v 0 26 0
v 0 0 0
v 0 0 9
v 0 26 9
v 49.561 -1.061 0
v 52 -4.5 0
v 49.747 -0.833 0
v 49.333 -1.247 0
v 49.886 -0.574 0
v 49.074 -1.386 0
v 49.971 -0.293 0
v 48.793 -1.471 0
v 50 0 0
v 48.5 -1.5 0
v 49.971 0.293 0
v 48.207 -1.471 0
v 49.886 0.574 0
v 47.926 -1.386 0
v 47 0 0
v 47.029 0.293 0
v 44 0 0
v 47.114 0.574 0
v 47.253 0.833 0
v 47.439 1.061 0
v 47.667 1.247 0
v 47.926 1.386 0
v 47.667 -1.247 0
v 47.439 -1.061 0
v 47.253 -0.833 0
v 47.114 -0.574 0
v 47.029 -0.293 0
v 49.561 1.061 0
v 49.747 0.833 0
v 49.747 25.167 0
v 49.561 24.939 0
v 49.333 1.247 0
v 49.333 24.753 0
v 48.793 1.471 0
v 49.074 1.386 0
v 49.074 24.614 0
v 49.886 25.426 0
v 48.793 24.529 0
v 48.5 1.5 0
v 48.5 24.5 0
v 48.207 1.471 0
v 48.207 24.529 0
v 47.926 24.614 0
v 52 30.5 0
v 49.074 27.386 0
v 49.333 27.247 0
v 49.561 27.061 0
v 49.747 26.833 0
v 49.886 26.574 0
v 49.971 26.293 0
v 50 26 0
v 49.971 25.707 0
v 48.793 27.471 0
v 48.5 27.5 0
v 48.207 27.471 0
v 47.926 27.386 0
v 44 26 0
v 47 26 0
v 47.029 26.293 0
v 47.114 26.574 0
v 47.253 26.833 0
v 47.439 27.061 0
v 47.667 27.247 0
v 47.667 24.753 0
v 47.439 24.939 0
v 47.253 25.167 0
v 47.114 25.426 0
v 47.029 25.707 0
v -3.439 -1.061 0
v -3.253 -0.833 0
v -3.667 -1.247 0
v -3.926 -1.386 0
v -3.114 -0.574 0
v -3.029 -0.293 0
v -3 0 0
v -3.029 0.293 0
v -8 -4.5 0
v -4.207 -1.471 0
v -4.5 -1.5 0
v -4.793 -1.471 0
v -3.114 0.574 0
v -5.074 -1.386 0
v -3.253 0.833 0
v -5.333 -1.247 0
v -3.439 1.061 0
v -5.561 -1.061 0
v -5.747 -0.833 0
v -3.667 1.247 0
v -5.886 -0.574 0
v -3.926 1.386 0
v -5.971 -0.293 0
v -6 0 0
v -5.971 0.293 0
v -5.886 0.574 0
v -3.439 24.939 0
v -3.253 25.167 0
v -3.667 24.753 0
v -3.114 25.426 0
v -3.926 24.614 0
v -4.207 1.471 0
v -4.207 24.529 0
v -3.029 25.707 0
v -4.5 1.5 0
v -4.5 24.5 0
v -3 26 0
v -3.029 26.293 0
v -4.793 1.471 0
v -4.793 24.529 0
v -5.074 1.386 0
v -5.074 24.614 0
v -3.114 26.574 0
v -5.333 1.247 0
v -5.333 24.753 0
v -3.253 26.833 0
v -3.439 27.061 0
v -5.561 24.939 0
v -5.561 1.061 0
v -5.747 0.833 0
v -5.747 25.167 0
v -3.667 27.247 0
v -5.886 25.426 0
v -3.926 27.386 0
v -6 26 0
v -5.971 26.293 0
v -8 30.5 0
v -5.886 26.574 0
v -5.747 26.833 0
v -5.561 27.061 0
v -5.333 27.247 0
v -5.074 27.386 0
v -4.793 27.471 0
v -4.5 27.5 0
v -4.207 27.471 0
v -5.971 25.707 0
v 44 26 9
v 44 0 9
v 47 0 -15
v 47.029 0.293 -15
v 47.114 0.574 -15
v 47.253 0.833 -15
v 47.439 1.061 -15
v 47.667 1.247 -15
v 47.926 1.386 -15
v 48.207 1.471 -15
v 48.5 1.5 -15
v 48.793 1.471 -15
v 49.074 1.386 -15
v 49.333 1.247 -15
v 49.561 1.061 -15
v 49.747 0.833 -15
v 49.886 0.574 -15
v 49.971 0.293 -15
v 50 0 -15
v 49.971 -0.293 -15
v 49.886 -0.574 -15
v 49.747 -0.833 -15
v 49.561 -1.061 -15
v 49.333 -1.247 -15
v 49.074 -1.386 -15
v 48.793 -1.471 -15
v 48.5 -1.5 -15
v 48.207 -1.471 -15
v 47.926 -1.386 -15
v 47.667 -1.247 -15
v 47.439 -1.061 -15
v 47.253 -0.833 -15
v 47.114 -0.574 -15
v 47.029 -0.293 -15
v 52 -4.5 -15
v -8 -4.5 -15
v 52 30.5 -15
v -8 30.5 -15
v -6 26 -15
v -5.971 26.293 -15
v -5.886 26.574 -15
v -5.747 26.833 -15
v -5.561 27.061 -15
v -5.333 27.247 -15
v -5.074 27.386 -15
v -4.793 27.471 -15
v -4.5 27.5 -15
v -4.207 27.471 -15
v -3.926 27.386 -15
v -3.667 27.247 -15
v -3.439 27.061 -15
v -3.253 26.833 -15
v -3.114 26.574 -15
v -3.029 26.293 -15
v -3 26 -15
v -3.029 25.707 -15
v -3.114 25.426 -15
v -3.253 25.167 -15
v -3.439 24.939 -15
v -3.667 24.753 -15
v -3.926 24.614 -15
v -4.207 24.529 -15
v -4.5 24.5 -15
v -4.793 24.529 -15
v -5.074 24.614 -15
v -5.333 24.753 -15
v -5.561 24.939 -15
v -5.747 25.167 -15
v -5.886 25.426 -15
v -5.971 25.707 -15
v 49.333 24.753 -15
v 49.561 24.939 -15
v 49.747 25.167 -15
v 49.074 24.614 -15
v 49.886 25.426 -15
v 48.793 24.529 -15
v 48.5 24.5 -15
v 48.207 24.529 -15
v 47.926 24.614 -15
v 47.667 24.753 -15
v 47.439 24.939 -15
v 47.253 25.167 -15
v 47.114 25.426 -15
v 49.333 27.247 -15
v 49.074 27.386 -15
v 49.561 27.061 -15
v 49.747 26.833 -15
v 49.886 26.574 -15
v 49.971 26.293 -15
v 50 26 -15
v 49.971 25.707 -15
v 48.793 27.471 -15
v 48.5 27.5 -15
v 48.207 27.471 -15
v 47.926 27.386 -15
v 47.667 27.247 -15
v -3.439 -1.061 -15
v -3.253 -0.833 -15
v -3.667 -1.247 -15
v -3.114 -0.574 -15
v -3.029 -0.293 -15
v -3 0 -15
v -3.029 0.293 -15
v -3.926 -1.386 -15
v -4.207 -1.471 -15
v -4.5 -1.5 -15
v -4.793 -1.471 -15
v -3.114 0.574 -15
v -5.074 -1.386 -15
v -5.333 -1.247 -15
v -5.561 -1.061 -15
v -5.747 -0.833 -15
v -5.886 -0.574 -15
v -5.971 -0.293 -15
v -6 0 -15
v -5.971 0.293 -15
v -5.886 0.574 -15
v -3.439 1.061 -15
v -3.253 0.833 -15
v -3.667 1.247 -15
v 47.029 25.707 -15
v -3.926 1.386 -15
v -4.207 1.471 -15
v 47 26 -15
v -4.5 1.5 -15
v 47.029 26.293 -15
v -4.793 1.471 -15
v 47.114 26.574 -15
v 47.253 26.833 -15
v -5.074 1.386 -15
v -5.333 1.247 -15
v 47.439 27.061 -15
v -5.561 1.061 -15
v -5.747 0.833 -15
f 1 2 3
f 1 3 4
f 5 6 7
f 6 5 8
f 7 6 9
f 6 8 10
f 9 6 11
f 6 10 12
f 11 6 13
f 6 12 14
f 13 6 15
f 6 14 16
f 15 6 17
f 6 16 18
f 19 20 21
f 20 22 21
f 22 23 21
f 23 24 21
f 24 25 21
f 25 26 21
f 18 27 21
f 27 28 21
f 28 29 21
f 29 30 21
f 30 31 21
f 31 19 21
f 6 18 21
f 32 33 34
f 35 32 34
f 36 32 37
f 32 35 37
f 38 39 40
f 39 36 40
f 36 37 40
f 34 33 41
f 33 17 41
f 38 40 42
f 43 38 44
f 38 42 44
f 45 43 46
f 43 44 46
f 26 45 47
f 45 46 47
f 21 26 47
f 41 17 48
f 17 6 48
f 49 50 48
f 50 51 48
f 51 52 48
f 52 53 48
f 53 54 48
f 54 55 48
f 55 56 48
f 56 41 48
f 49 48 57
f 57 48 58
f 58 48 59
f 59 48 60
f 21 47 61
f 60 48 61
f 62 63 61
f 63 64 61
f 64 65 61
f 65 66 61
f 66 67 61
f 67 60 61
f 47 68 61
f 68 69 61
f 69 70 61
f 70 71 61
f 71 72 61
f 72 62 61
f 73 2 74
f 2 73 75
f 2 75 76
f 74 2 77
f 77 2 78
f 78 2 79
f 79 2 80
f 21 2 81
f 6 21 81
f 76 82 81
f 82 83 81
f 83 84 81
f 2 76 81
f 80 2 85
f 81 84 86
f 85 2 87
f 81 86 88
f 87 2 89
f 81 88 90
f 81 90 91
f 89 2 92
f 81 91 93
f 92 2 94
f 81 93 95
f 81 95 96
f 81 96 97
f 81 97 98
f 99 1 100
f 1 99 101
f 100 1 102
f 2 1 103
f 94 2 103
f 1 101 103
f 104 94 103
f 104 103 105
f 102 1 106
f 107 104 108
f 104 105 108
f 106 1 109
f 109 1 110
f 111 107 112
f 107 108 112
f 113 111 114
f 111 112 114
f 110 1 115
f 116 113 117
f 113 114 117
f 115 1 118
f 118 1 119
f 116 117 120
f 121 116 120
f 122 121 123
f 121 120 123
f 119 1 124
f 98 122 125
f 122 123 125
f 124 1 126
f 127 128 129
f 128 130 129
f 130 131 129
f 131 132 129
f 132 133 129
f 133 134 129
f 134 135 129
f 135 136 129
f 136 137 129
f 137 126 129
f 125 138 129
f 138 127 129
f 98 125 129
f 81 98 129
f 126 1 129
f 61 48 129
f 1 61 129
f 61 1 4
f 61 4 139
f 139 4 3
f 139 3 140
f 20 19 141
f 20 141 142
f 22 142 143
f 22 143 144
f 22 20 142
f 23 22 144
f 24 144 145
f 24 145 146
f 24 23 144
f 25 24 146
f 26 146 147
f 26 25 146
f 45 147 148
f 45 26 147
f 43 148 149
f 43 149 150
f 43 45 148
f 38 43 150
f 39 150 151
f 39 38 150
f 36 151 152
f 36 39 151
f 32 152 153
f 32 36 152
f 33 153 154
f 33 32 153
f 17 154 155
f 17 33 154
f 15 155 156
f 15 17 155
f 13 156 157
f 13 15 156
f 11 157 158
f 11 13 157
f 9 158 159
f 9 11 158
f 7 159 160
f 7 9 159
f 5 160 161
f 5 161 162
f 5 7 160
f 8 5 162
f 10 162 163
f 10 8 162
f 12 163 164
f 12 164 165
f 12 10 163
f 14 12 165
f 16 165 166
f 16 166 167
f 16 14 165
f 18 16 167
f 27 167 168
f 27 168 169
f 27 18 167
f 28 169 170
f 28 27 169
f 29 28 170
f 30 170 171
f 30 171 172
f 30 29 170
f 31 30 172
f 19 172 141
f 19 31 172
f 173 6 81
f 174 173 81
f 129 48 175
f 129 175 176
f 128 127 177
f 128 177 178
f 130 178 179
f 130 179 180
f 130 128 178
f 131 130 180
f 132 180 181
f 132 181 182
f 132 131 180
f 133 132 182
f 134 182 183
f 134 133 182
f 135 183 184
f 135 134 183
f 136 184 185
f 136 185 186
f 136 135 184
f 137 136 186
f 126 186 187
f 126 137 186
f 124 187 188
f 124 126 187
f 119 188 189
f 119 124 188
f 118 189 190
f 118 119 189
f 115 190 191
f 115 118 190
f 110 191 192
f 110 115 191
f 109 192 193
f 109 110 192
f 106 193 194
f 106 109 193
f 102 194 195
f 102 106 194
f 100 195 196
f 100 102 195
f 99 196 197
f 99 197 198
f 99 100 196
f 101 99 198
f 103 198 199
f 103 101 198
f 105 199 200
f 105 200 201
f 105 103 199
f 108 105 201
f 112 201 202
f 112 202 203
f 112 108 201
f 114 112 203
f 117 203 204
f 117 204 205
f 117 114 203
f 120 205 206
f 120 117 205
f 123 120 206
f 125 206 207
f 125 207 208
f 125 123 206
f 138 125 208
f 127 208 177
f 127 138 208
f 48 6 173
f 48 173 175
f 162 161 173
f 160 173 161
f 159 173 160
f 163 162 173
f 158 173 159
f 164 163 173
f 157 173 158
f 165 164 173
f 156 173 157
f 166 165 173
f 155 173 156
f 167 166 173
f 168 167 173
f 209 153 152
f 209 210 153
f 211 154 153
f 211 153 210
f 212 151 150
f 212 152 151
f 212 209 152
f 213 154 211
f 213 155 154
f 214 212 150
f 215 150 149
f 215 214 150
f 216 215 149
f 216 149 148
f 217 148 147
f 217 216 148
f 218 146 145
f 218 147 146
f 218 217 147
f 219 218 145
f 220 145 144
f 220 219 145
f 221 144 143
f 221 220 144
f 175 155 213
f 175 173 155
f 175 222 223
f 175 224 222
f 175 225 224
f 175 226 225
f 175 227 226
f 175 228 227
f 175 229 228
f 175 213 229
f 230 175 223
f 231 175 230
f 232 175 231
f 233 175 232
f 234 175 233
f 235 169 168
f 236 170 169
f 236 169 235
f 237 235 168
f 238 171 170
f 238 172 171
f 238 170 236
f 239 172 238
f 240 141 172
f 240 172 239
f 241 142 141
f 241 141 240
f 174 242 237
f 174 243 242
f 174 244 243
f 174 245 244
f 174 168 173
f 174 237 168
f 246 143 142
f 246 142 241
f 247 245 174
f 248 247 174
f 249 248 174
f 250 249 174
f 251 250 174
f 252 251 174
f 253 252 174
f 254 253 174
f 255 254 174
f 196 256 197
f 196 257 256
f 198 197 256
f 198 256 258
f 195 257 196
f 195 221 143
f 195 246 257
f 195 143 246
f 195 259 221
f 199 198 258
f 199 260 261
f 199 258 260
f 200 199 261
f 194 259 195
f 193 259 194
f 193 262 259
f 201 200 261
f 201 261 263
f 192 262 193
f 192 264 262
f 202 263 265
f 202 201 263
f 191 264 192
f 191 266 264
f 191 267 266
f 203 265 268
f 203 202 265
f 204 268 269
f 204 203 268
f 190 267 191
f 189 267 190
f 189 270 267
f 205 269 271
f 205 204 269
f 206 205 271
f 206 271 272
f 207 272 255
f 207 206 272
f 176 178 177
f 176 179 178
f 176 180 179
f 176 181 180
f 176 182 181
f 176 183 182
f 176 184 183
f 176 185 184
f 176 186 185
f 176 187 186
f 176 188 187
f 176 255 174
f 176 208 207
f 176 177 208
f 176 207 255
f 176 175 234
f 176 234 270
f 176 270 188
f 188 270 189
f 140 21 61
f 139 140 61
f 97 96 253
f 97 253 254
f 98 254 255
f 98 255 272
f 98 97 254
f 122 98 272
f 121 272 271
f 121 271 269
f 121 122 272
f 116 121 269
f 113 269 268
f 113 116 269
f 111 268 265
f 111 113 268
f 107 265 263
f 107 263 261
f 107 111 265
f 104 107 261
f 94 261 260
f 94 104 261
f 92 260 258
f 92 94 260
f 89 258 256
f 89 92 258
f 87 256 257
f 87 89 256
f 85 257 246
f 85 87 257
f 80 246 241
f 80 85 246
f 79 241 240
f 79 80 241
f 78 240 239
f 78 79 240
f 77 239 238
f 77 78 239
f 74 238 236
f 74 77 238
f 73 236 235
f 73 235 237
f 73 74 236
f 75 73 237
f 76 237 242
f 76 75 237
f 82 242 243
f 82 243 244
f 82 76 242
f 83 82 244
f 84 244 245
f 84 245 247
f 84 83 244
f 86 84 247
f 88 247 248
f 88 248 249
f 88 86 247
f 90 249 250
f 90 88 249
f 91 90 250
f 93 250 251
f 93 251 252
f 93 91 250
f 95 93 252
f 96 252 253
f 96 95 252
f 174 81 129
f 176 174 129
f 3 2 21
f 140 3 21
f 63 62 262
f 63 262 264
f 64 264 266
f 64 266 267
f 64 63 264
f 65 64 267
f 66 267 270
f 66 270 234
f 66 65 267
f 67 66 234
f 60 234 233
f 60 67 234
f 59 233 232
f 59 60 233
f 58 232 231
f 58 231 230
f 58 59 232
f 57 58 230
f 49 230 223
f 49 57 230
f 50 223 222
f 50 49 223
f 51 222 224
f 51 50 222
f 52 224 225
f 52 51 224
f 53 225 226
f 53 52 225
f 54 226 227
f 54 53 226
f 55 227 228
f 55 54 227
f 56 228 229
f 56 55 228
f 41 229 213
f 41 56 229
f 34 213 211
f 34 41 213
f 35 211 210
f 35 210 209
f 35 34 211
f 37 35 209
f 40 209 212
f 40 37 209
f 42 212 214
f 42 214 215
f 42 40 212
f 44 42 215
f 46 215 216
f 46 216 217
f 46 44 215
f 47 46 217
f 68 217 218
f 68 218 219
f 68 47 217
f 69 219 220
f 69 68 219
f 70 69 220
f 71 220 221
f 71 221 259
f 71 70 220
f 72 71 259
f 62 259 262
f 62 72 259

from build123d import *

# Parameters (mm, degrees)
CROQUIS1_W              = 44
CROQUIS1_H              = 26
SALIENTE_EXTRUIR1_DEPTH = 9
CROQUIS2_W              = 60
CROQUIS2_H              = 35
CROQUIS2_R              = 1.5
SALIENTE_EXTRUIR2_DEPTH = 15


with BuildPart() as part:
    # Croquis1 → Saliente-Extruir1 (new body)
    with BuildSketch(Plane.XY):
        with Locations((22, 13)):
            Rectangle(CROQUIS1_W, CROQUIS1_H)
    extrude(amount=SALIENTE_EXTRUIR1_DEPTH)

    # Croquis2 → Saliente-Extruir2 (add)
    with BuildSketch(Plane(origin=(0, 0, 0), x_dir=(-1, 0, 0), z_dir=(0, 0, -1))):
        with Locations((-22, 13)):
            Rectangle(CROQUIS2_W, CROQUIS2_H)
        with Locations((-48.5, 26)):
            Circle(CROQUIS2_R, mode=Mode.SUBTRACT)
        with Locations((4.5, 26)):
            Circle(CROQUIS2_R, mode=Mode.SUBTRACT)
        with Locations((-48.5, 0)):
            Circle(CROQUIS2_R, mode=Mode.SUBTRACT)
        with Locations((4.5, 0)):
            Circle(CROQUIS2_R, mode=Mode.SUBTRACT)
    extrude(amount=SALIENTE_EXTRUIR2_DEPTH)


solid = part.part
